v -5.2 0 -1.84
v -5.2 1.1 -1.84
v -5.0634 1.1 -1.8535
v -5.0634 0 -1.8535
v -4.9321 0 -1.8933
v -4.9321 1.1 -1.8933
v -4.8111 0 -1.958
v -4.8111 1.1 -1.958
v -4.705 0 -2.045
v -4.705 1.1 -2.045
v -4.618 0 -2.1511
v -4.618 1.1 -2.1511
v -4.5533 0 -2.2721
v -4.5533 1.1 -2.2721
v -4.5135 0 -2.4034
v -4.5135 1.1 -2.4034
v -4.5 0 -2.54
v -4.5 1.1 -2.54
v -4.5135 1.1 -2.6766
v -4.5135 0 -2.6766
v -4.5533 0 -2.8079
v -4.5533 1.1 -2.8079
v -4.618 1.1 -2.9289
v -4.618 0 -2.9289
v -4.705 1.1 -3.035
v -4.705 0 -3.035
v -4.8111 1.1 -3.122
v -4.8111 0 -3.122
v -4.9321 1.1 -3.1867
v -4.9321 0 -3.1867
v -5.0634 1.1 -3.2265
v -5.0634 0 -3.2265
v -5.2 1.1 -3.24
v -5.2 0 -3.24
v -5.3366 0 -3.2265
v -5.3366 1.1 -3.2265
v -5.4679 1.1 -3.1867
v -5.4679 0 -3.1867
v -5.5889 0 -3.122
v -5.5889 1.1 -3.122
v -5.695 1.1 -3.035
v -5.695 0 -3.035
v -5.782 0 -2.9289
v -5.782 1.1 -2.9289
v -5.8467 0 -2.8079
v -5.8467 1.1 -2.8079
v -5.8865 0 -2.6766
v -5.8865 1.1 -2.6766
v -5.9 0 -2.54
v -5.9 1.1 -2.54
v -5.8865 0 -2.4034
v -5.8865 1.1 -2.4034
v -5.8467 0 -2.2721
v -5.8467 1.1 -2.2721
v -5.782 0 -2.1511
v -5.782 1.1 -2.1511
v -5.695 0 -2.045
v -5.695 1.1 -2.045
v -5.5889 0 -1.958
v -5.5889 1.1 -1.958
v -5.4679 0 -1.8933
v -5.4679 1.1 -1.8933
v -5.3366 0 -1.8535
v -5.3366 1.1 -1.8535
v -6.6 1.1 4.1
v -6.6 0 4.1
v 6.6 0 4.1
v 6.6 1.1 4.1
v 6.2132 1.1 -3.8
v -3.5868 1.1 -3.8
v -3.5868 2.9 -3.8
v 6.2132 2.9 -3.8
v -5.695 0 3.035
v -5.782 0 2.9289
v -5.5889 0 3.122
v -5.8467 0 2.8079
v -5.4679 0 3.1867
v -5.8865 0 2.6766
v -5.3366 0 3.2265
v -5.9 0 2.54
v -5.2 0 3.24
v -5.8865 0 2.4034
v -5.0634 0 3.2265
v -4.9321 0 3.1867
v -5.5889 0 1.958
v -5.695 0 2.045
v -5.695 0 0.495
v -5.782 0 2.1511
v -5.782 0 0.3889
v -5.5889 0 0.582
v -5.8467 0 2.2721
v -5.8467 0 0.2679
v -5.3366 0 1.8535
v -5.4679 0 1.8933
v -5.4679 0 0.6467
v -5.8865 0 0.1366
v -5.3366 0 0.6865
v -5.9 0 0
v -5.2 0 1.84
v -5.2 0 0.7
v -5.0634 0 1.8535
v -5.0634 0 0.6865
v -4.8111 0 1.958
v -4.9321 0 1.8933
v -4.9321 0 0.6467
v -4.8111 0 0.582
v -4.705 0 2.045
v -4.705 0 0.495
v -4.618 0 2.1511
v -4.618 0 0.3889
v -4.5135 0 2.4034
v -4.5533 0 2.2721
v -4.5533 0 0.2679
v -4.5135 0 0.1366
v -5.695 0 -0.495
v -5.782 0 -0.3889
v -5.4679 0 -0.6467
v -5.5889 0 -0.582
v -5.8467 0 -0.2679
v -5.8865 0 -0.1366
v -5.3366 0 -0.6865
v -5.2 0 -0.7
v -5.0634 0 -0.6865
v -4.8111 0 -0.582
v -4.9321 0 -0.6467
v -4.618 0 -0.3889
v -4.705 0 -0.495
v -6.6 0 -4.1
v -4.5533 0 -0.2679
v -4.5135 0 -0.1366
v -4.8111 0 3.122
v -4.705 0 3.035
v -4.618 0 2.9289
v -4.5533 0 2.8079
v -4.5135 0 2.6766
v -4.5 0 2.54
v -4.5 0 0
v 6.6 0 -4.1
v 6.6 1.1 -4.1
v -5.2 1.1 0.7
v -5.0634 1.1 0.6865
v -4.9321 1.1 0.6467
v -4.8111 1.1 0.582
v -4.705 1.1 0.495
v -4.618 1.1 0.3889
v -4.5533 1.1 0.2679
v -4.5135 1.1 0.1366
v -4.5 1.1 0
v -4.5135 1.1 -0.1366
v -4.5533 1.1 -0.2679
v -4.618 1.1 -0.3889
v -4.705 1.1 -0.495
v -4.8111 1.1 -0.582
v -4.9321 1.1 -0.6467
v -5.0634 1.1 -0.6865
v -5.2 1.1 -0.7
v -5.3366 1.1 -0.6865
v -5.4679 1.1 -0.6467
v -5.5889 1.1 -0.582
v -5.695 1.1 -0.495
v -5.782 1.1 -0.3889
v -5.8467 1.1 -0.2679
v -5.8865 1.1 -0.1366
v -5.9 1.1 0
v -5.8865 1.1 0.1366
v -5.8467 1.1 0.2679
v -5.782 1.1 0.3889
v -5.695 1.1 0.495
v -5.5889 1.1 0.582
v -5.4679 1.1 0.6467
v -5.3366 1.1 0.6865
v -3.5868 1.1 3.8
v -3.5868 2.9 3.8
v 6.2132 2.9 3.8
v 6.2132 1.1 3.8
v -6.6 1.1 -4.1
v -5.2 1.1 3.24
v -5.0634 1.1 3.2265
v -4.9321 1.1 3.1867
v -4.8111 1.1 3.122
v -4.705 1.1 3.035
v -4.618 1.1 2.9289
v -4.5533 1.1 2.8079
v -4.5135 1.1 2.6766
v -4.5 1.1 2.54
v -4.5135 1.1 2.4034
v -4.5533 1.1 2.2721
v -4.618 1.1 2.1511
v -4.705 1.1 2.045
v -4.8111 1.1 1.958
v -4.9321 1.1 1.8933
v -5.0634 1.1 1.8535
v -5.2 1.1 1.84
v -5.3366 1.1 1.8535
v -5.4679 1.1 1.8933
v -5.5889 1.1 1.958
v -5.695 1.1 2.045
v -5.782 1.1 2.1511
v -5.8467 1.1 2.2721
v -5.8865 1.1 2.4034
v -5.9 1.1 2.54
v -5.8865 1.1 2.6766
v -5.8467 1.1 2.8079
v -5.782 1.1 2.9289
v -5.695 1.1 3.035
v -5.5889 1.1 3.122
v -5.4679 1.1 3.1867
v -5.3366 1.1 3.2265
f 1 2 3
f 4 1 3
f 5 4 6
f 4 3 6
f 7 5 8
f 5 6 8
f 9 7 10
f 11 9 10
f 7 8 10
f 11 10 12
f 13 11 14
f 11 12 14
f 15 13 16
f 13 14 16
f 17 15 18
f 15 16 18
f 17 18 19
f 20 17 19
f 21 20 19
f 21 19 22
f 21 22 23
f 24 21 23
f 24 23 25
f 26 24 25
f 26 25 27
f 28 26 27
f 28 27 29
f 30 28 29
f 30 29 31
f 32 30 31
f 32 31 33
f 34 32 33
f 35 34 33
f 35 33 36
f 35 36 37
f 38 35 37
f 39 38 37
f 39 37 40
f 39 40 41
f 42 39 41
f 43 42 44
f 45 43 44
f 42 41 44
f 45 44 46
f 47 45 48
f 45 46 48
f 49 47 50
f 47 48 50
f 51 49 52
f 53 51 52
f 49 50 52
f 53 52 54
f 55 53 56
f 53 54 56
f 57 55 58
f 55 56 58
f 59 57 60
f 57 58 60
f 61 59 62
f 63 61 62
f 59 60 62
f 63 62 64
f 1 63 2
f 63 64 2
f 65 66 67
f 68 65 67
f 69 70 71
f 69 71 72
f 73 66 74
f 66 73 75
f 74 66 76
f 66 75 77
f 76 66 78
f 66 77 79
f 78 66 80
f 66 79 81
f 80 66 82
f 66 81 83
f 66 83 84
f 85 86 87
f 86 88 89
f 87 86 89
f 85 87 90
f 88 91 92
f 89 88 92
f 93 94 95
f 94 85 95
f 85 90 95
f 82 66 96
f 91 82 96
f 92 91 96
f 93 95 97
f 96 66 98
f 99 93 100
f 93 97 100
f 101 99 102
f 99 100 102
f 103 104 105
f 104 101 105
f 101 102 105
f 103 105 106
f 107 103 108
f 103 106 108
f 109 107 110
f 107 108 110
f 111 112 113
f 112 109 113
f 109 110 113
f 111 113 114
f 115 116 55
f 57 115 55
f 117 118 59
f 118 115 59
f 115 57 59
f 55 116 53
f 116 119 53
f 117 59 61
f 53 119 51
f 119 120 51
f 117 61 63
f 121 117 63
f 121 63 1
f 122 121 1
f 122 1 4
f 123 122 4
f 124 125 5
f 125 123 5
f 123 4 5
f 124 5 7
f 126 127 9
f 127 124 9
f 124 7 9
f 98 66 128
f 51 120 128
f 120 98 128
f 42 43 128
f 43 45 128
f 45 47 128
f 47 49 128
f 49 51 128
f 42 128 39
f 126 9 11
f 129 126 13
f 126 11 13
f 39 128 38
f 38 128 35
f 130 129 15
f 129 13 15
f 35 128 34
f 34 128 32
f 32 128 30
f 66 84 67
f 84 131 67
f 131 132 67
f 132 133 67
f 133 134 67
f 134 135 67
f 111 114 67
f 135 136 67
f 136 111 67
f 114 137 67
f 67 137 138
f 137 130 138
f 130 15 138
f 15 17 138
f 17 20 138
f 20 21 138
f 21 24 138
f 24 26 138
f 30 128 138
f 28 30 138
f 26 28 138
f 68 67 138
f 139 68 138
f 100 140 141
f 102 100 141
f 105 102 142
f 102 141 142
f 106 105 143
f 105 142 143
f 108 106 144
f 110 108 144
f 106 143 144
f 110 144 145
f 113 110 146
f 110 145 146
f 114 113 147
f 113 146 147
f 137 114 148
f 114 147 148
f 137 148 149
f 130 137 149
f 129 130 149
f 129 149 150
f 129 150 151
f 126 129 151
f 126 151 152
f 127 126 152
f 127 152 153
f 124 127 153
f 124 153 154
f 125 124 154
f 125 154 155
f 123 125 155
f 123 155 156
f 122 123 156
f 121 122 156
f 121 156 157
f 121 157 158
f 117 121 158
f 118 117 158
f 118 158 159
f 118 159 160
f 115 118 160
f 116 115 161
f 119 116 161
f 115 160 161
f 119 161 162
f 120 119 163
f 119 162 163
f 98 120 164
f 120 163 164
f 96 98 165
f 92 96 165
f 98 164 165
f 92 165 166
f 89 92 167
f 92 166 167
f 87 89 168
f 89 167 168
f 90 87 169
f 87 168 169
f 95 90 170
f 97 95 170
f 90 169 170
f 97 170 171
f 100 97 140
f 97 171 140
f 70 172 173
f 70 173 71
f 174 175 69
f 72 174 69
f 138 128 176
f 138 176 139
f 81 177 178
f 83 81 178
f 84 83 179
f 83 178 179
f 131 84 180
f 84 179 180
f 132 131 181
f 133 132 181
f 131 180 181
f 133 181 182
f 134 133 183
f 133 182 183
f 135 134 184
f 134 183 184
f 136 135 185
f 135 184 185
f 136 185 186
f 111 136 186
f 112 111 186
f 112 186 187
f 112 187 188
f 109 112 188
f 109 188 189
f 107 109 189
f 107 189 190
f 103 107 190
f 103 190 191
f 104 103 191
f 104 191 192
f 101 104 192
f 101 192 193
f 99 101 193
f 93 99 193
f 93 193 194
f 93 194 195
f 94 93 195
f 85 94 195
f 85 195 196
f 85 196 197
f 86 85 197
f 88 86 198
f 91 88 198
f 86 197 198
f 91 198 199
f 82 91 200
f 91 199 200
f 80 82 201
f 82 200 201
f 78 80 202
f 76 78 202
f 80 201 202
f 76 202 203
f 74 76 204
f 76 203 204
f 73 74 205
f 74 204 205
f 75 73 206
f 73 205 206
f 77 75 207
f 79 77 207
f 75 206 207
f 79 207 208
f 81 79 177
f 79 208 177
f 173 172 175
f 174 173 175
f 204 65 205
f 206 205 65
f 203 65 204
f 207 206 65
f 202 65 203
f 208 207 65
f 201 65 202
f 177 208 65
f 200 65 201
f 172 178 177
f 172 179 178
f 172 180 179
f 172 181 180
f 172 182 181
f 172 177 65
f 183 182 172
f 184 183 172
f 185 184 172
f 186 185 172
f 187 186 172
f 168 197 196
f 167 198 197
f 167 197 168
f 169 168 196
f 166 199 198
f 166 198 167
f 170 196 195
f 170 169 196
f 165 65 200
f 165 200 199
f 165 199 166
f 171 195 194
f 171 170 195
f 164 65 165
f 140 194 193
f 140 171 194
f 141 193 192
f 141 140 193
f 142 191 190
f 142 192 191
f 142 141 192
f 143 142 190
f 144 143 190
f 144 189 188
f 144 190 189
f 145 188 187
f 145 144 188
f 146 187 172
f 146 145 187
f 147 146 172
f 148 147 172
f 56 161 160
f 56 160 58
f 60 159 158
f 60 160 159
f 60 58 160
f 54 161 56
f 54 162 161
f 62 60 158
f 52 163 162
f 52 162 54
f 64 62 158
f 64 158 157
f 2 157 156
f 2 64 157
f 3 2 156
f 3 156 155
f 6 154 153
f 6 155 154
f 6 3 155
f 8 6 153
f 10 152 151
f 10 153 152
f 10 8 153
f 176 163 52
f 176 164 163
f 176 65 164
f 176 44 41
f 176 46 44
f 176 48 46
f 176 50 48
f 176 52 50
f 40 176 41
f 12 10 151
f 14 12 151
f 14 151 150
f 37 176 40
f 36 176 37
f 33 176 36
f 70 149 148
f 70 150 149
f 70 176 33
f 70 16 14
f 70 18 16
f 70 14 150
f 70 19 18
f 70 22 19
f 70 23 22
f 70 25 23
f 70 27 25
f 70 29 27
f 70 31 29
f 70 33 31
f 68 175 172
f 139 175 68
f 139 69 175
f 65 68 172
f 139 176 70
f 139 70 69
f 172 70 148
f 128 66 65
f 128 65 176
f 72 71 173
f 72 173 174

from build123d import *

# Parameters (mm, degrees)
SKETCH_1_W          = 13.2
SKETCH_1_H          = 8.2
EXTRUDE_1_DEPTH     = 1.1
SKETCH_3_W          = 9.8
SKETCH_3_H          = 7.6
EXTRUDE_2_DEPTH     = 1.8
SKETCH_2_R          = 0.7
CUT_EXTRUDE_1_DEPTH = 8.975587753


with BuildPart() as part:
    # Эскиз1 → Бобышка-Вытянуть1 (new body)
    with BuildSketch(Plane(origin=(0, 0, 0), x_dir=(1, 0, 0), z_dir=(0, 1, 0))):
        Rectangle(SKETCH_1_W, SKETCH_1_H)
    extrude(amount=EXTRUDE_1_DEPTH)

    # Эскиз3 → Бобышка-Вытянуть2 (add)
    with BuildSketch(Plane(origin=(0, 1.1, 0), x_dir=(1, 0, 0), z_dir=(0, 1, 0))):
        with Locations((1.313157895, 0)):
            Rectangle(SKETCH_3_W, SKETCH_3_H)
    extrude(amount=EXTRUDE_2_DEPTH)

    # Эскиз2 → Вырез-Вытянуть1 (cut, through all)
    with BuildSketch(Plane(origin=(0, 1.1, 0), x_dir=(1, 0, 0), z_dir=(0, 1, 0))):
        with Locations(Location((-5.2, -2.54, 0), (0, 0, 270))):
            Circle(SKETCH_2_R)
        with Locations(Location((-5.2, 0, 0), (0, 0, 270))):
            Circle(SKETCH_2_R)
        with Locations(Location((-5.2, 2.54, 0), (0, 0, 270))):
            Circle(SKETCH_2_R)
    extrude(amount=-CUT_EXTRUDE_1_DEPTH, mode=Mode.SUBTRACT)


solid = part.part
